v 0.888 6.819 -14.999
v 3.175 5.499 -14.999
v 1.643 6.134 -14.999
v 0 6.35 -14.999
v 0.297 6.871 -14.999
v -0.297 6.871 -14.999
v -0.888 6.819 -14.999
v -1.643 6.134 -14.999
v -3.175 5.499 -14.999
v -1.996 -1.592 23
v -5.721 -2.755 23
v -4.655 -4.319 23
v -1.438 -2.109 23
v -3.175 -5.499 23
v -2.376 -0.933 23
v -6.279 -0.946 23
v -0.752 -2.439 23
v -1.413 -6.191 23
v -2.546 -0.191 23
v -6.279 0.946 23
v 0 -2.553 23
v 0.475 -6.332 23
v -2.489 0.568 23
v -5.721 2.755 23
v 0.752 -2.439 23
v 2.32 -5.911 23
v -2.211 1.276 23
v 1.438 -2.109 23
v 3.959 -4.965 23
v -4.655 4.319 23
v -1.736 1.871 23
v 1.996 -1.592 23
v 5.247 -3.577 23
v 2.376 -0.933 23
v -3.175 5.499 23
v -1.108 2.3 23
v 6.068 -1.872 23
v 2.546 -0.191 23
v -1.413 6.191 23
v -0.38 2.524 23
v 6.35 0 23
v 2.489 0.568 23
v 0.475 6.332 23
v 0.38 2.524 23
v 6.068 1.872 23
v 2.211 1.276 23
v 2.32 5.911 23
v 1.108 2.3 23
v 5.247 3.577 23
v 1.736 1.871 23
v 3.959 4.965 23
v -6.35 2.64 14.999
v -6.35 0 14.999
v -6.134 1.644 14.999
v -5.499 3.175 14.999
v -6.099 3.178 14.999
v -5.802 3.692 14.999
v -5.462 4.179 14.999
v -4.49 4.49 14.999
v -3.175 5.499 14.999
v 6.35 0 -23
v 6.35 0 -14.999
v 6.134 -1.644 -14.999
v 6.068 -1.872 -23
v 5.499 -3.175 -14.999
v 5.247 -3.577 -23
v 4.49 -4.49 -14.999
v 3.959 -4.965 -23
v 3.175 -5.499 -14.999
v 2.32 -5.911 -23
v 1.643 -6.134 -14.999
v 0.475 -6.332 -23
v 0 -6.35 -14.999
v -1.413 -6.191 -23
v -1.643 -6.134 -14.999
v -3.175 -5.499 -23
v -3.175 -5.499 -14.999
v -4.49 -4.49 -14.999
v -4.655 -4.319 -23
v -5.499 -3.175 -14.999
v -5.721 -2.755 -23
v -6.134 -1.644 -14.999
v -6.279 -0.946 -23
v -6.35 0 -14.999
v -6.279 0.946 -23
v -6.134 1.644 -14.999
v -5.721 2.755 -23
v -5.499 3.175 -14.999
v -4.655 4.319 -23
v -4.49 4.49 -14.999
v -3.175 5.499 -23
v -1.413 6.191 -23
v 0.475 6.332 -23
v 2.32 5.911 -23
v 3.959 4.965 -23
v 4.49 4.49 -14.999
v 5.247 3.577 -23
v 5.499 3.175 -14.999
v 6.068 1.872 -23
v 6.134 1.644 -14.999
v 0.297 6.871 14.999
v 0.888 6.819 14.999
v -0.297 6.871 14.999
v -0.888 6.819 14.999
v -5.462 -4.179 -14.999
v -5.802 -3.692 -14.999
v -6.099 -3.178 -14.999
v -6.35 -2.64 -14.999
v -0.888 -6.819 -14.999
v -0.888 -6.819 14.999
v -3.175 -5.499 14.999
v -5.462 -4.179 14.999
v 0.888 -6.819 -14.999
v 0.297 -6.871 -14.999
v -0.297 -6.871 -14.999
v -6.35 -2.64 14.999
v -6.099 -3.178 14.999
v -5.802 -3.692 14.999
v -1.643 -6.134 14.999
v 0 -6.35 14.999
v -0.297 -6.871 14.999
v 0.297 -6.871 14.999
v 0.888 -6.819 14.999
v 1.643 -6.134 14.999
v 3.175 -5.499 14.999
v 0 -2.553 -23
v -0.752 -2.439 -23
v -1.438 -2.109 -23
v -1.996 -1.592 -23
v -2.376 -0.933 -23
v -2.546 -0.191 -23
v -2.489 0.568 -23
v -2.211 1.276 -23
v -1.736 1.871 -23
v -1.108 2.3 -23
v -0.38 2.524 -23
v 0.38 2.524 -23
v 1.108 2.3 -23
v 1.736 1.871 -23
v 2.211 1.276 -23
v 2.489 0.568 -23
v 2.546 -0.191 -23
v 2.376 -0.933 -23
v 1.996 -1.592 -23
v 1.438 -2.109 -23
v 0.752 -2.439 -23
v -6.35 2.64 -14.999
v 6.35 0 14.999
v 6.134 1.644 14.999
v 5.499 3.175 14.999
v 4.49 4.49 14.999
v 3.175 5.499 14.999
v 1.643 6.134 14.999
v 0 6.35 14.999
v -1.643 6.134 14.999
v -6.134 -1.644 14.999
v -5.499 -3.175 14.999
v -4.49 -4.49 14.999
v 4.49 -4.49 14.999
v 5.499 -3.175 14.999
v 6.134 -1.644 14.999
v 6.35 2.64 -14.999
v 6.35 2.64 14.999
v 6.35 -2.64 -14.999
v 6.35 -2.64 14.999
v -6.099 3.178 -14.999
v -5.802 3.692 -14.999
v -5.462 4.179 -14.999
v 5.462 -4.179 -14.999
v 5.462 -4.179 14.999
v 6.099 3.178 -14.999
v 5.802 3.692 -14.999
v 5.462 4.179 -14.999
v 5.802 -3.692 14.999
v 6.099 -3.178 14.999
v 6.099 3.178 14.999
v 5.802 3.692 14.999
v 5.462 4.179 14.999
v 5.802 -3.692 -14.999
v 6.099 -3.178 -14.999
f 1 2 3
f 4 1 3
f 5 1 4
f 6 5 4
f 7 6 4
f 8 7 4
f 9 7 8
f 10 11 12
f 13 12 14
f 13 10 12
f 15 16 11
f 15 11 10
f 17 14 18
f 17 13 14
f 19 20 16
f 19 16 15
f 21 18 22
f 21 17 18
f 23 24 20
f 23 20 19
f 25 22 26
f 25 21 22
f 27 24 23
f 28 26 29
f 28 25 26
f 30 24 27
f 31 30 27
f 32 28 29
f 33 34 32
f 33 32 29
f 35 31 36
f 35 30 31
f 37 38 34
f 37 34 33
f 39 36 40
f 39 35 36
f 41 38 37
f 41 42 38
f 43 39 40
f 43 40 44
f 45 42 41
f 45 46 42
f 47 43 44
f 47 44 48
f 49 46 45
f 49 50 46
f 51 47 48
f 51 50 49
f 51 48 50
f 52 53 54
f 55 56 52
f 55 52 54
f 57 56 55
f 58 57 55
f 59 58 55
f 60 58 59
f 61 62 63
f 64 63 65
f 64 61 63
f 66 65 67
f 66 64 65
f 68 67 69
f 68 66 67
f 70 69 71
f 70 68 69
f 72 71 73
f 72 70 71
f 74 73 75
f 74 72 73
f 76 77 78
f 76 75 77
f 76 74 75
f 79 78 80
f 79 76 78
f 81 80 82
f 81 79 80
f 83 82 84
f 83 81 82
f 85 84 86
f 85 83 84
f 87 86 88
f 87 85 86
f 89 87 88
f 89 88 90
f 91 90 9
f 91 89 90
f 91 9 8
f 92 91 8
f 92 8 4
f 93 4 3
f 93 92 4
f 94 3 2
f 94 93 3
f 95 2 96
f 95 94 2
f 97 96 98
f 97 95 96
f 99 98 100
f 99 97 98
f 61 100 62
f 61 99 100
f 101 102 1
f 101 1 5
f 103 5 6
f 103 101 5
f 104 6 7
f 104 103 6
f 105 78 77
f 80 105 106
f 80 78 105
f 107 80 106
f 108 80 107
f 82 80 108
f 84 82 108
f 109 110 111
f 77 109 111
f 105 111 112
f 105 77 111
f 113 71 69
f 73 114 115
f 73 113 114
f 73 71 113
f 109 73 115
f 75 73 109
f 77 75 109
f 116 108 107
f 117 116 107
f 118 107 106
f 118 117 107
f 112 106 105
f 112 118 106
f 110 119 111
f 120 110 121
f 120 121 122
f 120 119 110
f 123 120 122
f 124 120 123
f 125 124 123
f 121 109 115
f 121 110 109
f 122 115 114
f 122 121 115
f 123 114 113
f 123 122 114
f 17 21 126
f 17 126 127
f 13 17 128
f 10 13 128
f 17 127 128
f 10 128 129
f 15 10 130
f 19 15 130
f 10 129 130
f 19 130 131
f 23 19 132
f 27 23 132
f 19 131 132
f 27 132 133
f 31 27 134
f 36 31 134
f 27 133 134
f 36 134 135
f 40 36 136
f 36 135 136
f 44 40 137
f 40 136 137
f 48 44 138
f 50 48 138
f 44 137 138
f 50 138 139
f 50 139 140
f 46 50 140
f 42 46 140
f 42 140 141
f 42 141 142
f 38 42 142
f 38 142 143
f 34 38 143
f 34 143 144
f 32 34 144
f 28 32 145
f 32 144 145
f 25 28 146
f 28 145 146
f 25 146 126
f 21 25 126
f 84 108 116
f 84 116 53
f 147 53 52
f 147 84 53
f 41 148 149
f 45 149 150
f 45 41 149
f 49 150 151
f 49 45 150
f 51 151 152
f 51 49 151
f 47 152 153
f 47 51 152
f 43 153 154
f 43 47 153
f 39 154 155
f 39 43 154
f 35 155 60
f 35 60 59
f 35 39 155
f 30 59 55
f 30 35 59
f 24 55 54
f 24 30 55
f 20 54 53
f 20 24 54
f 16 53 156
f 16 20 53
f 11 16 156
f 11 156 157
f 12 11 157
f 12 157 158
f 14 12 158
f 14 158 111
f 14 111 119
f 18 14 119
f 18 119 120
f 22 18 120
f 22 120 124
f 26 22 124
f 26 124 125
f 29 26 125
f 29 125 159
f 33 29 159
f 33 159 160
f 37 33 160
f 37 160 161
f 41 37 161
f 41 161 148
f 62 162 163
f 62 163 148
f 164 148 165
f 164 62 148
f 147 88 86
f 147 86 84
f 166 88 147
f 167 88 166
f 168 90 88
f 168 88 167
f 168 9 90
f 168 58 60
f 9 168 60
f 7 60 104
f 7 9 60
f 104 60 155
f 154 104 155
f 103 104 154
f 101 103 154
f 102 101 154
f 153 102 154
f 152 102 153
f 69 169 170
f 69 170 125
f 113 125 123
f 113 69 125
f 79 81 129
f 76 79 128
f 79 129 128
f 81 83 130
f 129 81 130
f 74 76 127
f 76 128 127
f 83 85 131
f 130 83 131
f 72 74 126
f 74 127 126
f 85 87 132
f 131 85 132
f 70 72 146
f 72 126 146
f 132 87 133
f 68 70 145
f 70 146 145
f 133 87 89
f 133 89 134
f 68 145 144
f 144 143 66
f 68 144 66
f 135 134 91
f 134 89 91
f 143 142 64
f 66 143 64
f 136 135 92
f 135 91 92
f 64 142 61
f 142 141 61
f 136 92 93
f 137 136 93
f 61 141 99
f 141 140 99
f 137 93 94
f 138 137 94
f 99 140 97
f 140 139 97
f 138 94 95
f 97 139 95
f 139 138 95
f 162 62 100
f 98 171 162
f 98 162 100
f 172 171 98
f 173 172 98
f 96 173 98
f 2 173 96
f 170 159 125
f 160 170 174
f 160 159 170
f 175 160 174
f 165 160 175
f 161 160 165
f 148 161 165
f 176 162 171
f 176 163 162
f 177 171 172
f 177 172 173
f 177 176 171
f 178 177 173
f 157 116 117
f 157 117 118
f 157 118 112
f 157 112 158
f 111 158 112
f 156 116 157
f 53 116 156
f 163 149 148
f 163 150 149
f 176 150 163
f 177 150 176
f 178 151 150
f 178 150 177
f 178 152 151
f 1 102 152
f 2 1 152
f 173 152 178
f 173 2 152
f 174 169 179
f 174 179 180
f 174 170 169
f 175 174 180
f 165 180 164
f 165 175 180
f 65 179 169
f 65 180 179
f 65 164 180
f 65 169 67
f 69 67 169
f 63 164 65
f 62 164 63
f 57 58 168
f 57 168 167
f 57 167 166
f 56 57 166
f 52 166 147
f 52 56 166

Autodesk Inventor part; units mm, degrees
ref_plane "YZ Plane" through (0, 0, 0) normal (1, 0, 0) x (0, 1, 0)
ref_plane "XZ Plane" through (0, 0, 0) normal (0, 1, 0) x (-1, 0, 0)
ref_plane "XY Plane" through (0, 0, 0) normal (0, 0, 1) x (1, 0, 0)
sketch "Sketch1" plane through (0, 0, 0) normal (0, 0, 1) x (1, 0, 0)
  line L0 (-6.35, -3.6662) -> (-6.35, 3.6662)
  line L1 (-6.35, 3.6662) -> (0, 7.3323)
  line L2 (0, 7.3323) -> (6.35, 3.6662)
  line L3 (6.35, 3.6662) -> (6.35, -3.6662)
  line L4 (6.35, -3.6662) -> (0, -7.3323)
  line L5 (0, -7.3323) -> (-6.35, -3.6662)
  point P0 (0, 0)
  point P1 (0, 0)
  dimension "Size" = 12.7
extrude "Extrusion1" add sketch "Sketch1" along normal mid plane 45.9994
sketch "Sketch3" plane through (0, 0, 22.9997) normal (0, 0, 1) x (1, 0, 0)
  line L0 (-6.35, 3.6662) -> (0, 7.3323) construction
  line L1 (0, 7.3323) -> (6.35, 3.6662) construction
  line L2 (6.35, 3.6662) -> (6.35, -3.6662) construction
  line L3 (6.35, -3.6662) -> (0, -7.3323) construction
  line L4 (0, -7.3323) -> (-6.35, -3.6662) construction
  line L5 (-6.35, -3.6662) -> (-6.35, 3.6662) construction
  point P0 (0, 0)
hole "Hole1" at (0, 0, 22.9997) direction (0, 0, -1) diameter 5.1054 end through all
sketch "Sketch4" plane through (0, 0, 22.9997) normal (0, 0, 1) x (1, 0, 0)
  circle A0 centre (0, 0) radius 2.5527 construction
  line L0 (-6.35, 3.6662) -> (0, 7.3323) construction
  line L1 (0, 7.3323) -> (6.35, 3.6662) construction
  line L2 (6.35, 3.6662) -> (6.35, -3.6662) construction
  line L3 (6.35, -3.6662) -> (0, -7.3323) construction
  line L4 (0, -7.3323) -> (-6.35, -3.6662) construction
  line L5 (-6.35, -3.6662) -> (-6.35, 3.6662) construction
  circle A1 centre (0, 0) radius 6.8771
  circle A2 centre (0, 0) radius 8.89
  dimension "thunder" = 13.7541
  dimension "d16" = 17.78
extrude "Extrusion3" cut sketch "Sketch4" against normal through all
sketch "Sketch5" plane through (0, 0, 22.9997) normal (0, 0, 1) x (1, 0, 0)
  circle A0 centre (0, 0) radius 6.35
  arc A1 (5.4616, -4.1791) -> (6.35, -2.6403) centre (0, 0) ccw projected
  line L0 (6.35, -2.6403) -> (6.35, 2.6403) projected
  arc A2 (6.35, 2.6403) -> (5.4616, 4.1791) centre (0, 0) ccw projected
  line L1 (5.4616, 4.1791) -> (0.8884, 6.8194) projected
  arc A3 (0.8884, 6.8194) -> (-0.8884, 6.8194) centre (0, 0) ccw projected
  line L2 (-0.8884, 6.8194) -> (-5.4616, 4.1791) projected
  arc A4 (-5.4616, 4.1791) -> (-6.35, 2.6403) centre (0, 0) ccw projected
  line L3 (-6.35, 2.6403) -> (-6.35, -2.6403) projected
  arc A5 (-6.35, -2.6403) -> (-5.4616, -4.1791) centre (0, 0) ccw projected
  line L4 (-5.4616, -4.1791) -> (-0.8884, -6.8194) projected
  arc A6 (-0.8884, -6.8194) -> (0.8884, -6.8194) centre (0, 0) ccw projected
  line L5 (0.8884, -6.8194) -> (5.4616, -4.1791) projected
  circle A7 centre (0, 0) radius 2.5527 projected
  point P0 (3.175, -5.4993)
  point P1 (-3.175, -5.4993)
  point P2 (-6.35, 0)
  point P3 (-3.175, 5.4993)
  point P4 (3.175, 5.4993)
  point P5 (6.35, 0)
  dimension "d19" = 12.7
extrude "Extrusion4" cut sketch "Sketch5" against normal blind 8.001 contours L0 A1 L5 A0 | A0 L1 A2 L0 | A0 L2 A3 L1 | L5 A6 L4 A0 | A0 L3 A4 L2 | L4 A5 L3 A0
mirror "Mirror2" about plane through (0, 0, 0) normal (0, 0, 1) of "Extrusion4"
ref_plane "Work Plane1" through (0, 0, 0) normal (0, 0, 1) x (1, 0, 0)
equation "\"bearing\" = 25.4"
properties part number "GP5-029" material "Aluminum 6061"
